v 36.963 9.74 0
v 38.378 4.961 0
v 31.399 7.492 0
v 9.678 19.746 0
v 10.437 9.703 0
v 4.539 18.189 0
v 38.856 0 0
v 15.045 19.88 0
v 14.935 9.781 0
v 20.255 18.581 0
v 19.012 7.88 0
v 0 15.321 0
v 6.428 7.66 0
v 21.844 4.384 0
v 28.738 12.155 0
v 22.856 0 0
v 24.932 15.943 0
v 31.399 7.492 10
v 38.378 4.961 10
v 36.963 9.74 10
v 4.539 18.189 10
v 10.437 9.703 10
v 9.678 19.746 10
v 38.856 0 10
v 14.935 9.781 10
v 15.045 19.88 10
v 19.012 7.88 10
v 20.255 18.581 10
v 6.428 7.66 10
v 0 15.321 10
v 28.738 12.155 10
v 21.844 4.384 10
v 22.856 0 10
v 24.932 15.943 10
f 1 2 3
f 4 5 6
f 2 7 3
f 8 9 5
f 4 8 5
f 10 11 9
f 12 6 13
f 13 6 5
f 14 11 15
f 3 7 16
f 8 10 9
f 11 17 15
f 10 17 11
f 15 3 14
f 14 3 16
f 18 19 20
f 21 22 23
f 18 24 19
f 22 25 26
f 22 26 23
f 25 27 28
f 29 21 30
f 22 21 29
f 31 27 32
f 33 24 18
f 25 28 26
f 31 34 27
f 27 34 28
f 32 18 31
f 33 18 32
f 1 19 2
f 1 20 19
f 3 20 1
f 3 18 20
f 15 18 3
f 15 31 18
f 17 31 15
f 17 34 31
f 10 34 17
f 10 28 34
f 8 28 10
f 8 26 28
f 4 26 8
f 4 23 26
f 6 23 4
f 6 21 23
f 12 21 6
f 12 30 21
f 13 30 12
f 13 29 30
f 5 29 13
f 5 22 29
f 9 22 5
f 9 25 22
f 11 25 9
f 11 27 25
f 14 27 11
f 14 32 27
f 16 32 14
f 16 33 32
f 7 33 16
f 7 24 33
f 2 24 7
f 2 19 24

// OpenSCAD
$fn = 32;

// ----------------------------------------------------------------------
// Arc stop: segment, 10 mm thick
// ----------------------------------------------------------------------

// --- parameters (mm) ---
profile_height = 10;      // extrusion height
profile_points = 17;      // points of the closed outline

profile = [[38.856, 0], [38.378, 4.961], [36.963, 9.74], [31.399, 7.492], [28.738, 12.155], [24.932, 15.943], [20.255, 18.581], [15.045, 19.88], [9.678, 19.746], [4.539, 18.189], [0, 15.321], [6.428, 7.66], [10.437, 9.703], [14.935, 9.781], [19.012, 7.88], [21.844, 4.384], [22.856, 0]];  // single closed polygon, 17 points, counter clockwise

// --- the one profile operation ---
linear_extrude(height = profile_height) polygon(points = profile);
